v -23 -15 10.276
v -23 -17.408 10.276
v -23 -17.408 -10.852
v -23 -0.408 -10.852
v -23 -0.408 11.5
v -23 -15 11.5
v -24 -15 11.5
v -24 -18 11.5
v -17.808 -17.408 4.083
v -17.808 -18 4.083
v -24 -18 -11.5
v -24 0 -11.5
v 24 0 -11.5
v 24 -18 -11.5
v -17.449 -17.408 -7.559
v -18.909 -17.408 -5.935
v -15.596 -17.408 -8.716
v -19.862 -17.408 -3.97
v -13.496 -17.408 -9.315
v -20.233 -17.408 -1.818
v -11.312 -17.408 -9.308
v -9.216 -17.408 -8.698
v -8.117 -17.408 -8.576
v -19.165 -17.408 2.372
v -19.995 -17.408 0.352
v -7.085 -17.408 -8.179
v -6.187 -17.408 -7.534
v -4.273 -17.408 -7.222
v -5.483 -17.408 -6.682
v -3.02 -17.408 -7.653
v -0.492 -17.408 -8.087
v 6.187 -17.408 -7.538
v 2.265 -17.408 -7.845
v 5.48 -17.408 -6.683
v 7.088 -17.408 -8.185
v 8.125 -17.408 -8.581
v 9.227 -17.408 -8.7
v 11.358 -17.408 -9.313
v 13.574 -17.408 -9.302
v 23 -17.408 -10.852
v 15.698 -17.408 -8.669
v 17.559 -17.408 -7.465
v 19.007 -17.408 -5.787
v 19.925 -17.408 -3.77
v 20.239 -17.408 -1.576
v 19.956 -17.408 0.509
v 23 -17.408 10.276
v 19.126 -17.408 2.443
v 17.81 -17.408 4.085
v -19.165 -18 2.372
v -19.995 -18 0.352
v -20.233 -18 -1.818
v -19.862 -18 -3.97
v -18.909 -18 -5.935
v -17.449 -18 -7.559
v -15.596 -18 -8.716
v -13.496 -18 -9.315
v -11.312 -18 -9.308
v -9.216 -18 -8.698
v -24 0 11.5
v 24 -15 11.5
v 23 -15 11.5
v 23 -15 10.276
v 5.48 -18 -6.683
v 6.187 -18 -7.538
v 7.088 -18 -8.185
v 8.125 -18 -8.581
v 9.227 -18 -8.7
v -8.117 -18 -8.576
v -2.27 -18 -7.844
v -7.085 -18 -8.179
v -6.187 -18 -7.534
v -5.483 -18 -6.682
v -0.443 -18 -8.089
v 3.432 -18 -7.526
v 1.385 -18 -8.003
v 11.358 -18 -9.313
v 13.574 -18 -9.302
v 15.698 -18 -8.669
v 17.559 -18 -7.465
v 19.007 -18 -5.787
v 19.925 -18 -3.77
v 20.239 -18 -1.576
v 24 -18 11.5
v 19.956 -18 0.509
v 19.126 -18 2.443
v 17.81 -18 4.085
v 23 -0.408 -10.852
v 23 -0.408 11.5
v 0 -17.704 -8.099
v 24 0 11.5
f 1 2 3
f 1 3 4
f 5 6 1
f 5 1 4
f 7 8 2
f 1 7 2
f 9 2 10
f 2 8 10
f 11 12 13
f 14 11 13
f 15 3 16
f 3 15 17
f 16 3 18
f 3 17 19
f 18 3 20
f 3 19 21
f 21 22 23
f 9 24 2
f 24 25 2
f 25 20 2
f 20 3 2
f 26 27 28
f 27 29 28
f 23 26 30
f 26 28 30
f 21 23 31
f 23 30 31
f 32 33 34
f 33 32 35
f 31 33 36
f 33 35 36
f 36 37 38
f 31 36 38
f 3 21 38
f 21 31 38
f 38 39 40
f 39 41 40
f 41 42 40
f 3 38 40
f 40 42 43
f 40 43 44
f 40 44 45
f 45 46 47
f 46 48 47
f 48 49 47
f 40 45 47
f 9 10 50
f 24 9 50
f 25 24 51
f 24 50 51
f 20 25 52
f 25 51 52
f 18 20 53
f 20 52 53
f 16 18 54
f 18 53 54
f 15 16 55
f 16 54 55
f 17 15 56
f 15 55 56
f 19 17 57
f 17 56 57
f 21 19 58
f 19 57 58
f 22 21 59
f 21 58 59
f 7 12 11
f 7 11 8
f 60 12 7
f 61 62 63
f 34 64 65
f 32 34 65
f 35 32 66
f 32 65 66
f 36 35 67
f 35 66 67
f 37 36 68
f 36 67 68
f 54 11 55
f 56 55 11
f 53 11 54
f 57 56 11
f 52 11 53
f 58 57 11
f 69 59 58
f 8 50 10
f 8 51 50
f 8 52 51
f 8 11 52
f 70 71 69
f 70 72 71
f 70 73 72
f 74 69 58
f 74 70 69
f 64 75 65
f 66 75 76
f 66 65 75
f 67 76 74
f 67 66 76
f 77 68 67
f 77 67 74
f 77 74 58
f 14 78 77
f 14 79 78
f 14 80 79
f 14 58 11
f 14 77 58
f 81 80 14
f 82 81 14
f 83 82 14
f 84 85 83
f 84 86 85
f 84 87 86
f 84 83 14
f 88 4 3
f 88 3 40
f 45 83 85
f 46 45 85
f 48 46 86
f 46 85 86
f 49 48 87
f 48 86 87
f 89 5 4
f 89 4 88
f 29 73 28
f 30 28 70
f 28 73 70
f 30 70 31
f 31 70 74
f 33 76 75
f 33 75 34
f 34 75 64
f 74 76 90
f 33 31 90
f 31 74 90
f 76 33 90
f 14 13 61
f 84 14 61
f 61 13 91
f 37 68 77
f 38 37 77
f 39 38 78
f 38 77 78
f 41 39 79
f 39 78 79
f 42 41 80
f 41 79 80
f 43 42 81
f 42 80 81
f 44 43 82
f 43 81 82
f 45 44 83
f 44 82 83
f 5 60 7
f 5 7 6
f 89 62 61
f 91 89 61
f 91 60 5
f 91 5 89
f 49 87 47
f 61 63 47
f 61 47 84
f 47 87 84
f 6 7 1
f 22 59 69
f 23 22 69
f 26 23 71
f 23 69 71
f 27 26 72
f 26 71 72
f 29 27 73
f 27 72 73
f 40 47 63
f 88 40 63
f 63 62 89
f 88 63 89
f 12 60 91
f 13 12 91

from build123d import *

# Parameters (mm, degrees)
F0_W     = 48
F0_H     = 23
F1_DEPTH = 18
F2_W     = 46
F2_H     = 17
F3_DEPTH = 22.352
F5_DEPTH = 3


with BuildPart() as f1:
    # F0 (on Front) → F1 (new body)
    with BuildSketch(Plane.XZ):
        Rectangle(F0_W, F0_H)
    extrude(amount=F1_DEPTH)

    # F2 (on face) → F3 (cut)
    with BuildSketch(Plane.XY.offset(11.5)):
        with Locations((-4.47e-08, -8.9078345299)):
            Rectangle(F2_W, F2_H)
    extrude(amount=-F3_DEPTH, mode=Mode.SUBTRACT)

    # F4 (on face) → F5 (cut)
    with BuildSketch(Plane.XZ.offset(18)):
        with BuildLine():
            Line((24, 11.5), (-24, 11.5))
            add(Edge.make_bspline(
                [(-24, 11.5), (-21.9359378716, 8.9716693602), (-19.8718757432, 6.4433387205), (-17.8078136148, 4.0833140133)],
                knots=[0, 0, 0, 0, 0.129003883, 0.129003883, 0.129003883, 0.129003883], degree=3))
            ThreePointArc((-17.8078136148, 4.0833140133), (-9.3465218784, 5.5998372929), (-4.6161396554, -1.5776821065))
            ThreePointArc((-4.6161396554, -1.5776821065), (-4.6838516535, -2.6039102527), (-4.8858136092, -3.6123449263))
            ThreePointArc((-4.8858136092, -3.6123449263), (-4.8967692227, -5.2028290958), (-5.482547982, -6.6815525873))
            add(Edge.make_bspline(
                [(-5.482547982, -6.6815525873), (-3.655031988, -7.5874926735), (-1.827515994, -8.0988723785), (0, -8.0988723785)],
                knots=[0.3857802504, 0.3857802504, 0.3857802504, 0.3857802504, 0.5, 0.5, 0.5, 0.5], degree=3))
            add(Edge.make_bspline(
                [(0, -8.0988723785), (1.8266966783, -8.0988723785), (3.6533933566, -7.5879510963), (5.4800900349, -6.6827708081)],
                knots=[0.5, 0.5, 0.5, 0.5, 0.6141685424, 0.6141685424, 0.6141685424, 0.6141685424], degree=3))
            ThreePointArc((5.4800900349, -6.6827708081), (4.8929807707, -5.1976220671), (4.8851620207, -3.6006552741))
            ThreePointArc((4.8851620207, -3.6006552741), (8.4364089916, 5.1373167643), (17.8096110461, 4.085369218))
            add(Edge.make_bspline(
                [(17.8096110461, 4.085369218), (19.8730740307, 6.4448065383), (21.9365370154, 8.9724032691), (24, 11.5)],
                knots=[0.8710335635, 0.8710335635, 0.8710335635, 0.8710335635, 1, 1, 1, 1], degree=3))
        make_face()
        with BuildLine():
            ThreePointArc((-4.6161396554, -1.5776821065), (-9.3465218784, 5.5998372929), (-17.8078136148, 4.0833140133))
            add(Edge.make_bspline(
                [(-17.8078136148, 4.0833140133), (-16.0140889616, 2.0323900412), (-14.2203643085, 0.1085718923), (-12.4266396554, -1.5776821065)],
                knots=[0.129003883, 0.129003883, 0.129003883, 0.129003883, 0.2411116738, 0.2411116738, 0.2411116738, 0.2411116738], degree=3))
            add(Edge.make_bspline(
                [(-12.4266396554, -1.5776821065), (-10.3534160171, -3.5266889647), (-8.2801923789, -5.1583289061), (-6.2069687406, -6.3020449167)],
                knots=[0.2411116738, 0.2411116738, 0.2411116738, 0.2411116738, 0.3706881512, 0.3706881512, 0.3706881512, 0.3706881512], degree=3))
            ThreePointArc((-6.2069687406, -6.3020449167), (-5.4161874116, -5.0211497754), (-4.8858136092, -3.6123449263))
            ThreePointArc((-4.8858136092, -3.6123449263), (-4.6838516535, -2.6039102527), (-4.6161396554, -1.5776821065))
        make_face()
        with BuildLine():
            add(Edge.make_bspline(
                [(-17.8078136148, 4.0833140133), (-16.0140889616, 2.0323900412), (-14.2203643085, 0.1085718923), (-12.4266396554, -1.5776821065)],
                knots=[0.129003883, 0.129003883, 0.129003883, 0.129003883, 0.2411116738, 0.2411116738, 0.2411116738, 0.2411116738], degree=3))
            ThreePointArc((-17.8078136148, 4.0833140133), (-18.9086098616, -5.9352011823), (-9.2157687538, -8.6976693469))
            ThreePointArc((-9.2157687538, -8.6976693469), (-13.0755167796, -6.1542936511), (-12.4266396554, -1.5776821065))
        make_face()
        with BuildLine():
            add(Edge.make_bspline(
                [(-12.4266396554, -1.5776821065), (-10.3534160171, -3.5266889647), (-8.2801923789, -5.1583289061), (-6.2069687406, -6.3020449167)],
                knots=[0.2411116738, 0.2411116738, 0.2411116738, 0.2411116738, 0.3706881512, 0.3706881512, 0.3706881512, 0.3706881512], degree=3))
            ThreePointArc((-12.4266396554, -1.5776821065), (-13.0755167796, -6.1542936511), (-9.2157687538, -8.6976693469))
            ThreePointArc((-9.2157687538, -8.6976693469), (-7.5616079145, -7.6879502193), (-6.2069687406, -6.3020449167))
        make_face()
        with BuildLine():
            ThreePointArc((-6.2069687406, -6.3020449167), (-7.5616079145, -7.6879502193), (-9.2157687538, -8.6976693469))
            ThreePointArc((-9.2157687538, -8.6976693469), (-7.0845998748, -8.1794909589), (-5.482547982, -6.6815525873))
            add(Edge.make_bspline(
                [(-6.2069687406, -6.3020449167), (-5.9654951544, -6.4352564051), (-5.7240215682, -6.5618487914), (-5.482547982, -6.6815525873)],
                knots=[0.3706881512, 0.3706881512, 0.3706881512, 0.3706881512, 0.3857802504, 0.3857802504, 0.3857802504, 0.3857802504], degree=3))
        make_face()
        with BuildLine():
            ThreePointArc((20.2391303397, -1.5758105962), (19.606097165, 1.5044296902), (17.8096110461, 4.085369218))
            add(Edge.make_bspline(
                [(12.4286303397, -1.5758105962), (14.2222905752, 0.1105585898), (16.0159508106, 2.0344340033), (17.8096110461, 4.085369218)],
                knots=[0.7589297987, 0.7589297987, 0.7589297987, 0.7589297987, 0.8710335635, 0.8710335635, 0.8710335635, 0.8710335635], degree=3))
            ThreePointArc((12.4286303397, -1.5758105962), (13.080424676, -6.1500390798), (9.2274737476, -8.7001706883))
            ThreePointArc((9.2274737476, -8.7001706883), (16.6713462557, -8.1334985962), (20.2391303397, -1.5758105962))
        make_face()
        with BuildLine():
            add(Edge.make_bspline(
                [(12.4286303397, -1.5758105962), (14.2222905752, 0.1105585898), (16.0159508106, 2.0344340033), (17.8096110461, 4.085369218)],
                knots=[0.7589297987, 0.7589297987, 0.7589297987, 0.7589297987, 0.8710335635, 0.8710335635, 0.8710335635, 0.8710335635], degree=3))
            ThreePointArc((17.8096110461, 4.085369218), (8.4364089916, 5.1373167643), (4.8851620207, -3.6006552741))
            ThreePointArc((4.8851620207, -3.6006552741), (5.4160889034, -5.0150216763), (6.2093732837, -6.300718206))
            add(Edge.make_bspline(
                [(6.2093732837, -6.300718206), (8.282458969, -5.1567010835), (10.3555446544, -3.5248908904), (12.4286303397, -1.5758105962)],
                knots=[0.6293619434, 0.6293619434, 0.6293619434, 0.6293619434, 0.7589297987, 0.7589297987, 0.7589297987, 0.7589297987], degree=3))
        make_face()
        with BuildLine():
            ThreePointArc((-4.8858136092, -3.6123449263), (-5.4161874116, -5.0211497754), (-6.2069687406, -6.3020449167))
            add(Edge.make_bspline(
                [(-6.2069687406, -6.3020449167), (-5.9654951544, -6.4352564051), (-5.7240215682, -6.5618487914), (-5.482547982, -6.6815525873)],
                knots=[0.3706881512, 0.3706881512, 0.3706881512, 0.3706881512, 0.3857802504, 0.3857802504, 0.3857802504, 0.3857802504], degree=3))
            ThreePointArc((-5.482547982, -6.6815525873), (-4.8967692227, -5.2028290958), (-4.8858136092, -3.6123449263))
        make_face()
        with BuildLine():
            ThreePointArc((9.2274737476, -8.7001706883), (13.080424676, -6.1500390798), (12.4286303397, -1.5758105962))
            add(Edge.make_bspline(
                [(6.2093732837, -6.300718206), (8.282458969, -5.1567010835), (10.3555446544, -3.5248908904), (12.4286303397, -1.5758105962)],
                knots=[0.6293619434, 0.6293619434, 0.6293619434, 0.6293619434, 0.7589297987, 0.7589297987, 0.7589297987, 0.7589297987], degree=3))
            ThreePointArc((6.2093732837, -6.300718206), (7.5680345553, -7.6896080143), (9.2274737476, -8.7001706883))
        make_face()
        with BuildLine():
            ThreePointArc((6.2093732837, -6.300718206), (5.4160889034, -5.0150216763), (4.8851620207, -3.6006552741))
            ThreePointArc((4.8851620207, -3.6006552741), (4.8929807707, -5.1976220671), (5.4800900349, -6.6827708081))
            add(Edge.make_bspline(
                [(5.4800900349, -6.6827708081), (5.7231844512, -6.5623105935), (5.9662788674, -6.4348680757), (6.2093732837, -6.300718206)],
                knots=[0.6141685424, 0.6141685424, 0.6141685424, 0.6141685424, 0.6293619434, 0.6293619434, 0.6293619434, 0.6293619434], degree=3))
        make_face()
        with BuildLine():
            ThreePointArc((9.2274737476, -8.7001706883), (7.5680345553, -7.6896080143), (6.2093732837, -6.300718206))
            add(Edge.make_bspline(
                [(5.4800900349, -6.6827708081), (5.7231844512, -6.5623105935), (5.9662788674, -6.4348680757), (6.2093732837, -6.300718206)],
                knots=[0.6141685424, 0.6141685424, 0.6141685424, 0.6141685424, 0.6293619434, 0.6293619434, 0.6293619434, 0.6293619434], degree=3))
            ThreePointArc((5.4800900349, -6.6827708081), (7.0883105329, -8.1845921438), (9.2274737476, -8.7001706883))
        make_face()
    extrude(amount=-F5_DEPTH, mode=Mode.SUBTRACT)


solid = f1.part
